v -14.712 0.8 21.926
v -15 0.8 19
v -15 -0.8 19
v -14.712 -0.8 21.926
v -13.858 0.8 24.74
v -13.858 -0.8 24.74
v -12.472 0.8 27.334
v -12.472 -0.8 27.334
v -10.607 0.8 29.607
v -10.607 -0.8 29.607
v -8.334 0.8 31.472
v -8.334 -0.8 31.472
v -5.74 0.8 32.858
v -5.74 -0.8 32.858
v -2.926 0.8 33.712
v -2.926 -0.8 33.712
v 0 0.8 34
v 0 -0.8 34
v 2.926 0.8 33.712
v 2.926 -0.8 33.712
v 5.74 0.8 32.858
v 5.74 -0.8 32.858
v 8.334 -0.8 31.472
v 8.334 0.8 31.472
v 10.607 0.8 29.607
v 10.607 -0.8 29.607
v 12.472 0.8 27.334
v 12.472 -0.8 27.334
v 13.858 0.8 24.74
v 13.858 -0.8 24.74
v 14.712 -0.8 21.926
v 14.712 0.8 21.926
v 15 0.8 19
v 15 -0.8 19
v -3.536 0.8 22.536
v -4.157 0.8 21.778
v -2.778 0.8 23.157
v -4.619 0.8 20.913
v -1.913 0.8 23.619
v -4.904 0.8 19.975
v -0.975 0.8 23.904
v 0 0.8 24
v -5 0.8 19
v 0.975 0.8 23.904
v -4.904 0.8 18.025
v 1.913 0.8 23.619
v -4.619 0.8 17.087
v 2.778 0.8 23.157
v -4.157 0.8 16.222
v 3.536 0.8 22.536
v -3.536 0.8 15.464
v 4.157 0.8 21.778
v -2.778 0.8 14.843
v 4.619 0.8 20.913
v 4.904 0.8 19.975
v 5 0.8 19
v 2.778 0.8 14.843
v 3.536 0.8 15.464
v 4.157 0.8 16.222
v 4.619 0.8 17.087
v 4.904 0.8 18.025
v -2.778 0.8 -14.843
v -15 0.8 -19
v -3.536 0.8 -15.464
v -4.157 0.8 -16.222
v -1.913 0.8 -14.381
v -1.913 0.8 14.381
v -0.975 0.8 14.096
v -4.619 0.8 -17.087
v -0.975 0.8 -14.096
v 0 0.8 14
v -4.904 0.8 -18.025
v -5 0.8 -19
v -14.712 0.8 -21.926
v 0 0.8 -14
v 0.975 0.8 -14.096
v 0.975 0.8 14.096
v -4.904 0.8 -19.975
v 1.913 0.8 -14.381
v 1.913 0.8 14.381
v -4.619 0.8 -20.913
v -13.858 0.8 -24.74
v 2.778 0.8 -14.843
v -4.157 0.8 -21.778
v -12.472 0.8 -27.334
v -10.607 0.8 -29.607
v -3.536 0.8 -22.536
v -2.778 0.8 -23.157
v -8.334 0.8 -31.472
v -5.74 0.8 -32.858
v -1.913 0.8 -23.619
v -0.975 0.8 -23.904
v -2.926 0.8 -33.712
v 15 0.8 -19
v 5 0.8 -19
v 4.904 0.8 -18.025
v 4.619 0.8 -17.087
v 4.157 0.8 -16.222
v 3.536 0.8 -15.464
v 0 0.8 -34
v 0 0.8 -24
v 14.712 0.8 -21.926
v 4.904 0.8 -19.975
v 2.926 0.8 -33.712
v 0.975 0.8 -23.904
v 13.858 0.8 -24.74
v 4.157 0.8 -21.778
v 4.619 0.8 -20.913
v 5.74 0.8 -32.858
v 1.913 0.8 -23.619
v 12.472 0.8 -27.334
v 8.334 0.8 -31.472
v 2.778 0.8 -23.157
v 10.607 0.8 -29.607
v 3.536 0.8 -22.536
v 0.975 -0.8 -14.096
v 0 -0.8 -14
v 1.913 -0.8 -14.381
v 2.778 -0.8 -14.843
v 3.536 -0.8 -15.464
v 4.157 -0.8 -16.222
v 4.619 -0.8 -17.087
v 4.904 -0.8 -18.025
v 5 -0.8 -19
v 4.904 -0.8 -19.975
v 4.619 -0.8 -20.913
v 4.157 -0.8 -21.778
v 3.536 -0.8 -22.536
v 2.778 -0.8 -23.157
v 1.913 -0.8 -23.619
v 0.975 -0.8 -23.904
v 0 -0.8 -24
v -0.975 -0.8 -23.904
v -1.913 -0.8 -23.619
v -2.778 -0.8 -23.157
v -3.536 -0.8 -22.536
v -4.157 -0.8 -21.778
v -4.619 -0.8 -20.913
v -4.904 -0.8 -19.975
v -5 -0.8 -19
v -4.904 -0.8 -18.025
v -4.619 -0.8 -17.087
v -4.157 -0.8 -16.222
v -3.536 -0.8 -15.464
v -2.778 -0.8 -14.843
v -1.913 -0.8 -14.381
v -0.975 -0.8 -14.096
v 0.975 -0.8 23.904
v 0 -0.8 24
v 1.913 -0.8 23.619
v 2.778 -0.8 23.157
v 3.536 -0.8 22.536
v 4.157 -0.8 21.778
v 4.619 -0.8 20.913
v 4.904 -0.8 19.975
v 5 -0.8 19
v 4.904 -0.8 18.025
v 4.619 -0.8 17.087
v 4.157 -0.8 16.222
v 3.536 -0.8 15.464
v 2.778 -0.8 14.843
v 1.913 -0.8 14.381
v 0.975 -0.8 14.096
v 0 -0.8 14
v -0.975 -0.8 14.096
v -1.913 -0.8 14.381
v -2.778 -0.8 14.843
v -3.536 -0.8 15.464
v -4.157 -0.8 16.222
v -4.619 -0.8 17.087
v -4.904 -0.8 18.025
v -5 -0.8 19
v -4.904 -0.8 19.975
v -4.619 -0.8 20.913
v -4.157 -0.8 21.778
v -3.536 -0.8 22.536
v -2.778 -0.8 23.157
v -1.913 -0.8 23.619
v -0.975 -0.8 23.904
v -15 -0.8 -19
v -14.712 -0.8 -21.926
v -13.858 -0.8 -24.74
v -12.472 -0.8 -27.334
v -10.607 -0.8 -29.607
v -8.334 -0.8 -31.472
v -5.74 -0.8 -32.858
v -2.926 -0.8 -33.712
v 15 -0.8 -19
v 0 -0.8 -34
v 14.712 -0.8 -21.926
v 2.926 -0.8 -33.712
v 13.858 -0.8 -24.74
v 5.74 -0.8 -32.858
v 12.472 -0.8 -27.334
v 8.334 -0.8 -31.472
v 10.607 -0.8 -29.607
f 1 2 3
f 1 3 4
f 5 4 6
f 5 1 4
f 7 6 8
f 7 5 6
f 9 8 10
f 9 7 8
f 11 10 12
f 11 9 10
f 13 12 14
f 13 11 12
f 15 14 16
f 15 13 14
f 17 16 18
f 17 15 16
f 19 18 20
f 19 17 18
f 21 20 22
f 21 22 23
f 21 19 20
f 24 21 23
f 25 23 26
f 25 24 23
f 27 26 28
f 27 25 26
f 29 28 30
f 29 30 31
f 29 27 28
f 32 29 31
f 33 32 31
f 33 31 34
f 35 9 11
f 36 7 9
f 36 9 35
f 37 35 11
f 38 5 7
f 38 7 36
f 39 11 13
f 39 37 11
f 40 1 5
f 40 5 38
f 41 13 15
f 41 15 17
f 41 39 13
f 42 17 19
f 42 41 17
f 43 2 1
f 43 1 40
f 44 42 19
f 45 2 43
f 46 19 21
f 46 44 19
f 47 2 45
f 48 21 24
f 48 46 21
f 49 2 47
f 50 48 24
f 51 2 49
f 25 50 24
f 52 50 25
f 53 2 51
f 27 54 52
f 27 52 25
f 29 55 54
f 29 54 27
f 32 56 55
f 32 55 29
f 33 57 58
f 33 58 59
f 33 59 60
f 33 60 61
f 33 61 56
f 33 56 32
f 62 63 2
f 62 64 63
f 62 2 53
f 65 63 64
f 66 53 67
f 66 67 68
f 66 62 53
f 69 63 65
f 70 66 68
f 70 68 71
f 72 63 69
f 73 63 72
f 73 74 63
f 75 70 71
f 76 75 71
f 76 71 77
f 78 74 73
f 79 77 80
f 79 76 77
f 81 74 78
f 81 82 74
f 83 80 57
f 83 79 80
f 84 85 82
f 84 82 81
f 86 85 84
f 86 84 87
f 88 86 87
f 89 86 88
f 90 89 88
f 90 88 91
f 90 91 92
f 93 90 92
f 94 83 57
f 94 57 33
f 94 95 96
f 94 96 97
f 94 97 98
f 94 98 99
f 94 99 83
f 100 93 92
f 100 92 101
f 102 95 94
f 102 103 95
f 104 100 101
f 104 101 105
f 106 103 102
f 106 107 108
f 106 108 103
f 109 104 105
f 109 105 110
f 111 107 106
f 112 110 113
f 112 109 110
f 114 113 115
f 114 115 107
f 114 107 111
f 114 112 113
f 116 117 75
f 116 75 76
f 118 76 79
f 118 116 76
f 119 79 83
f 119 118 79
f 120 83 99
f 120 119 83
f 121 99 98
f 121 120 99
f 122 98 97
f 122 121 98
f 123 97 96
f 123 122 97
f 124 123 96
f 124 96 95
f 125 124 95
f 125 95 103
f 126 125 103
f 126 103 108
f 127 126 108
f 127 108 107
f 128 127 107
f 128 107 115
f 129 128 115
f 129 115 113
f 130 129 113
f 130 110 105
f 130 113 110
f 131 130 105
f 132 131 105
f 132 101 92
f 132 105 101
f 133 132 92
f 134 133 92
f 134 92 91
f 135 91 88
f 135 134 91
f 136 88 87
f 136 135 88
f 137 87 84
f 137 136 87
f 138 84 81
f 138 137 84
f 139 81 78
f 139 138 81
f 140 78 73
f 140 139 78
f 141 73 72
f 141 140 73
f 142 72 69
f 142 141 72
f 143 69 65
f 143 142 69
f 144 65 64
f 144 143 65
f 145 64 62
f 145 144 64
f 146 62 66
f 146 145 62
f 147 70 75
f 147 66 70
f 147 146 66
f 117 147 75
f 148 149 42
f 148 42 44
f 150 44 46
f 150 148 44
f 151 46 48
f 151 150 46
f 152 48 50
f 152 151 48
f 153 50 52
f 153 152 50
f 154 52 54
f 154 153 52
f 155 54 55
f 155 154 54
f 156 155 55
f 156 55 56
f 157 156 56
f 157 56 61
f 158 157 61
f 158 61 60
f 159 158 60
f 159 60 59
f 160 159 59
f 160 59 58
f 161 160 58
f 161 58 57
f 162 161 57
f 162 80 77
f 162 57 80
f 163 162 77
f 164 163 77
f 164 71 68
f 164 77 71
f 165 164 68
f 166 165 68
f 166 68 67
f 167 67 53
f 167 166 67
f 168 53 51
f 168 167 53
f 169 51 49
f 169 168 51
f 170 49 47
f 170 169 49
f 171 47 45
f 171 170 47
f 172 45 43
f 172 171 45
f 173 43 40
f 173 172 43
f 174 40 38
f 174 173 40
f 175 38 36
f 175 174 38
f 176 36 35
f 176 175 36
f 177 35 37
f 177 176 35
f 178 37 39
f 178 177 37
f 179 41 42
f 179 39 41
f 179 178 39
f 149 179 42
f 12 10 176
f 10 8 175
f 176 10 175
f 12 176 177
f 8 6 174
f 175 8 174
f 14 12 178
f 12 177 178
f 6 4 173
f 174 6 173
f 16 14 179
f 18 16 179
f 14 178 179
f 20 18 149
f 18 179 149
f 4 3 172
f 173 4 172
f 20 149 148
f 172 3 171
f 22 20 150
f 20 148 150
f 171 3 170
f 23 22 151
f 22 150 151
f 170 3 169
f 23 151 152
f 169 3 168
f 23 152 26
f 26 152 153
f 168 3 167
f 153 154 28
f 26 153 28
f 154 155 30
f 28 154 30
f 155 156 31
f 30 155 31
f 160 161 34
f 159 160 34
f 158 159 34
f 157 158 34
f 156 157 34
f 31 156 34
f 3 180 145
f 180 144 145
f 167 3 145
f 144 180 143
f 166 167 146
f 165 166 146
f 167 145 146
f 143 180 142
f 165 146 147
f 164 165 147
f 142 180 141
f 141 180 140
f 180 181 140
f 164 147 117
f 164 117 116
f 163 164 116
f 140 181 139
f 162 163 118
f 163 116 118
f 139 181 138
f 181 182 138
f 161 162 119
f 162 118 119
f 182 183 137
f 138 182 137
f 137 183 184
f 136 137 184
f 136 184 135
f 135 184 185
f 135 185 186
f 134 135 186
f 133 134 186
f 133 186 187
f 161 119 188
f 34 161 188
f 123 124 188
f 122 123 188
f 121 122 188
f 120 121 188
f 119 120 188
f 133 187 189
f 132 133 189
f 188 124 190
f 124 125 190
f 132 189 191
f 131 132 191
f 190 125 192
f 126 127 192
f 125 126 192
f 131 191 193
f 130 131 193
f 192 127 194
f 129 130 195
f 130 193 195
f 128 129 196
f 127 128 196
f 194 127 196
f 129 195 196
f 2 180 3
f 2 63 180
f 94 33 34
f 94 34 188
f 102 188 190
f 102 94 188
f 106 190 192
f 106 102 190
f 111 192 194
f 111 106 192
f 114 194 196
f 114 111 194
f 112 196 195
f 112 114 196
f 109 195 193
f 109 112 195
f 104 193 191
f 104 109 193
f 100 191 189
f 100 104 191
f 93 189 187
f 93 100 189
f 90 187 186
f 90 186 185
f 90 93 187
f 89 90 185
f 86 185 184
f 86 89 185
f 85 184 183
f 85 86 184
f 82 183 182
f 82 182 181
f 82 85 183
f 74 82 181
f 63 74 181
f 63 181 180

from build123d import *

# Parameters (mm, degrees)
BOSS_EXTRUDE2_DEPTH     = 0.8
CUT_EXTRUDE2_DEPTH      = 38.170418346
CUT_EXTRUDE2_DEPTH_BACK = 38.170418346
SKETCH7_R               = 5


with BuildPart() as part:
    # Sketch6 → Boss-Extrude2 (new, symmetric)
    with BuildSketch(Plane(origin=(0, 0, 0), x_dir=(1, 0, 0), z_dir=(0, 1, 0))):
        with BuildLine():
            Line((-15, 19), (-15, -19))
            ThreePointArc((-15, -19), (0, -34), (15, -19))
            Line((15, -19), (15, 19))
            ThreePointArc((15, 19), (0, 34), (-15, 19))
        make_face()
    extrude(amount=BOSS_EXTRUDE2_DEPTH, both=True)

    # Sketch7 → Cut-Extrude2 (cut, two sides: drawn at the far end of the back side and taken through both)
    with BuildSketch(Plane(origin=(0, 0, 0), x_dir=(1, 0, 0), z_dir=(0, 1, 0)).offset(-CUT_EXTRUDE2_DEPTH_BACK)):
        with Locations(Location((0, 19, 0), (0, 0, 270))):
            Circle(SKETCH7_R)
        with Locations(Location((0, -19, 0), (0, 0, 270))):
            Circle(SKETCH7_R)
    extrude(amount=CUT_EXTRUDE2_DEPTH + CUT_EXTRUDE2_DEPTH_BACK, mode=Mode.SUBTRACT)


solid = part.part
